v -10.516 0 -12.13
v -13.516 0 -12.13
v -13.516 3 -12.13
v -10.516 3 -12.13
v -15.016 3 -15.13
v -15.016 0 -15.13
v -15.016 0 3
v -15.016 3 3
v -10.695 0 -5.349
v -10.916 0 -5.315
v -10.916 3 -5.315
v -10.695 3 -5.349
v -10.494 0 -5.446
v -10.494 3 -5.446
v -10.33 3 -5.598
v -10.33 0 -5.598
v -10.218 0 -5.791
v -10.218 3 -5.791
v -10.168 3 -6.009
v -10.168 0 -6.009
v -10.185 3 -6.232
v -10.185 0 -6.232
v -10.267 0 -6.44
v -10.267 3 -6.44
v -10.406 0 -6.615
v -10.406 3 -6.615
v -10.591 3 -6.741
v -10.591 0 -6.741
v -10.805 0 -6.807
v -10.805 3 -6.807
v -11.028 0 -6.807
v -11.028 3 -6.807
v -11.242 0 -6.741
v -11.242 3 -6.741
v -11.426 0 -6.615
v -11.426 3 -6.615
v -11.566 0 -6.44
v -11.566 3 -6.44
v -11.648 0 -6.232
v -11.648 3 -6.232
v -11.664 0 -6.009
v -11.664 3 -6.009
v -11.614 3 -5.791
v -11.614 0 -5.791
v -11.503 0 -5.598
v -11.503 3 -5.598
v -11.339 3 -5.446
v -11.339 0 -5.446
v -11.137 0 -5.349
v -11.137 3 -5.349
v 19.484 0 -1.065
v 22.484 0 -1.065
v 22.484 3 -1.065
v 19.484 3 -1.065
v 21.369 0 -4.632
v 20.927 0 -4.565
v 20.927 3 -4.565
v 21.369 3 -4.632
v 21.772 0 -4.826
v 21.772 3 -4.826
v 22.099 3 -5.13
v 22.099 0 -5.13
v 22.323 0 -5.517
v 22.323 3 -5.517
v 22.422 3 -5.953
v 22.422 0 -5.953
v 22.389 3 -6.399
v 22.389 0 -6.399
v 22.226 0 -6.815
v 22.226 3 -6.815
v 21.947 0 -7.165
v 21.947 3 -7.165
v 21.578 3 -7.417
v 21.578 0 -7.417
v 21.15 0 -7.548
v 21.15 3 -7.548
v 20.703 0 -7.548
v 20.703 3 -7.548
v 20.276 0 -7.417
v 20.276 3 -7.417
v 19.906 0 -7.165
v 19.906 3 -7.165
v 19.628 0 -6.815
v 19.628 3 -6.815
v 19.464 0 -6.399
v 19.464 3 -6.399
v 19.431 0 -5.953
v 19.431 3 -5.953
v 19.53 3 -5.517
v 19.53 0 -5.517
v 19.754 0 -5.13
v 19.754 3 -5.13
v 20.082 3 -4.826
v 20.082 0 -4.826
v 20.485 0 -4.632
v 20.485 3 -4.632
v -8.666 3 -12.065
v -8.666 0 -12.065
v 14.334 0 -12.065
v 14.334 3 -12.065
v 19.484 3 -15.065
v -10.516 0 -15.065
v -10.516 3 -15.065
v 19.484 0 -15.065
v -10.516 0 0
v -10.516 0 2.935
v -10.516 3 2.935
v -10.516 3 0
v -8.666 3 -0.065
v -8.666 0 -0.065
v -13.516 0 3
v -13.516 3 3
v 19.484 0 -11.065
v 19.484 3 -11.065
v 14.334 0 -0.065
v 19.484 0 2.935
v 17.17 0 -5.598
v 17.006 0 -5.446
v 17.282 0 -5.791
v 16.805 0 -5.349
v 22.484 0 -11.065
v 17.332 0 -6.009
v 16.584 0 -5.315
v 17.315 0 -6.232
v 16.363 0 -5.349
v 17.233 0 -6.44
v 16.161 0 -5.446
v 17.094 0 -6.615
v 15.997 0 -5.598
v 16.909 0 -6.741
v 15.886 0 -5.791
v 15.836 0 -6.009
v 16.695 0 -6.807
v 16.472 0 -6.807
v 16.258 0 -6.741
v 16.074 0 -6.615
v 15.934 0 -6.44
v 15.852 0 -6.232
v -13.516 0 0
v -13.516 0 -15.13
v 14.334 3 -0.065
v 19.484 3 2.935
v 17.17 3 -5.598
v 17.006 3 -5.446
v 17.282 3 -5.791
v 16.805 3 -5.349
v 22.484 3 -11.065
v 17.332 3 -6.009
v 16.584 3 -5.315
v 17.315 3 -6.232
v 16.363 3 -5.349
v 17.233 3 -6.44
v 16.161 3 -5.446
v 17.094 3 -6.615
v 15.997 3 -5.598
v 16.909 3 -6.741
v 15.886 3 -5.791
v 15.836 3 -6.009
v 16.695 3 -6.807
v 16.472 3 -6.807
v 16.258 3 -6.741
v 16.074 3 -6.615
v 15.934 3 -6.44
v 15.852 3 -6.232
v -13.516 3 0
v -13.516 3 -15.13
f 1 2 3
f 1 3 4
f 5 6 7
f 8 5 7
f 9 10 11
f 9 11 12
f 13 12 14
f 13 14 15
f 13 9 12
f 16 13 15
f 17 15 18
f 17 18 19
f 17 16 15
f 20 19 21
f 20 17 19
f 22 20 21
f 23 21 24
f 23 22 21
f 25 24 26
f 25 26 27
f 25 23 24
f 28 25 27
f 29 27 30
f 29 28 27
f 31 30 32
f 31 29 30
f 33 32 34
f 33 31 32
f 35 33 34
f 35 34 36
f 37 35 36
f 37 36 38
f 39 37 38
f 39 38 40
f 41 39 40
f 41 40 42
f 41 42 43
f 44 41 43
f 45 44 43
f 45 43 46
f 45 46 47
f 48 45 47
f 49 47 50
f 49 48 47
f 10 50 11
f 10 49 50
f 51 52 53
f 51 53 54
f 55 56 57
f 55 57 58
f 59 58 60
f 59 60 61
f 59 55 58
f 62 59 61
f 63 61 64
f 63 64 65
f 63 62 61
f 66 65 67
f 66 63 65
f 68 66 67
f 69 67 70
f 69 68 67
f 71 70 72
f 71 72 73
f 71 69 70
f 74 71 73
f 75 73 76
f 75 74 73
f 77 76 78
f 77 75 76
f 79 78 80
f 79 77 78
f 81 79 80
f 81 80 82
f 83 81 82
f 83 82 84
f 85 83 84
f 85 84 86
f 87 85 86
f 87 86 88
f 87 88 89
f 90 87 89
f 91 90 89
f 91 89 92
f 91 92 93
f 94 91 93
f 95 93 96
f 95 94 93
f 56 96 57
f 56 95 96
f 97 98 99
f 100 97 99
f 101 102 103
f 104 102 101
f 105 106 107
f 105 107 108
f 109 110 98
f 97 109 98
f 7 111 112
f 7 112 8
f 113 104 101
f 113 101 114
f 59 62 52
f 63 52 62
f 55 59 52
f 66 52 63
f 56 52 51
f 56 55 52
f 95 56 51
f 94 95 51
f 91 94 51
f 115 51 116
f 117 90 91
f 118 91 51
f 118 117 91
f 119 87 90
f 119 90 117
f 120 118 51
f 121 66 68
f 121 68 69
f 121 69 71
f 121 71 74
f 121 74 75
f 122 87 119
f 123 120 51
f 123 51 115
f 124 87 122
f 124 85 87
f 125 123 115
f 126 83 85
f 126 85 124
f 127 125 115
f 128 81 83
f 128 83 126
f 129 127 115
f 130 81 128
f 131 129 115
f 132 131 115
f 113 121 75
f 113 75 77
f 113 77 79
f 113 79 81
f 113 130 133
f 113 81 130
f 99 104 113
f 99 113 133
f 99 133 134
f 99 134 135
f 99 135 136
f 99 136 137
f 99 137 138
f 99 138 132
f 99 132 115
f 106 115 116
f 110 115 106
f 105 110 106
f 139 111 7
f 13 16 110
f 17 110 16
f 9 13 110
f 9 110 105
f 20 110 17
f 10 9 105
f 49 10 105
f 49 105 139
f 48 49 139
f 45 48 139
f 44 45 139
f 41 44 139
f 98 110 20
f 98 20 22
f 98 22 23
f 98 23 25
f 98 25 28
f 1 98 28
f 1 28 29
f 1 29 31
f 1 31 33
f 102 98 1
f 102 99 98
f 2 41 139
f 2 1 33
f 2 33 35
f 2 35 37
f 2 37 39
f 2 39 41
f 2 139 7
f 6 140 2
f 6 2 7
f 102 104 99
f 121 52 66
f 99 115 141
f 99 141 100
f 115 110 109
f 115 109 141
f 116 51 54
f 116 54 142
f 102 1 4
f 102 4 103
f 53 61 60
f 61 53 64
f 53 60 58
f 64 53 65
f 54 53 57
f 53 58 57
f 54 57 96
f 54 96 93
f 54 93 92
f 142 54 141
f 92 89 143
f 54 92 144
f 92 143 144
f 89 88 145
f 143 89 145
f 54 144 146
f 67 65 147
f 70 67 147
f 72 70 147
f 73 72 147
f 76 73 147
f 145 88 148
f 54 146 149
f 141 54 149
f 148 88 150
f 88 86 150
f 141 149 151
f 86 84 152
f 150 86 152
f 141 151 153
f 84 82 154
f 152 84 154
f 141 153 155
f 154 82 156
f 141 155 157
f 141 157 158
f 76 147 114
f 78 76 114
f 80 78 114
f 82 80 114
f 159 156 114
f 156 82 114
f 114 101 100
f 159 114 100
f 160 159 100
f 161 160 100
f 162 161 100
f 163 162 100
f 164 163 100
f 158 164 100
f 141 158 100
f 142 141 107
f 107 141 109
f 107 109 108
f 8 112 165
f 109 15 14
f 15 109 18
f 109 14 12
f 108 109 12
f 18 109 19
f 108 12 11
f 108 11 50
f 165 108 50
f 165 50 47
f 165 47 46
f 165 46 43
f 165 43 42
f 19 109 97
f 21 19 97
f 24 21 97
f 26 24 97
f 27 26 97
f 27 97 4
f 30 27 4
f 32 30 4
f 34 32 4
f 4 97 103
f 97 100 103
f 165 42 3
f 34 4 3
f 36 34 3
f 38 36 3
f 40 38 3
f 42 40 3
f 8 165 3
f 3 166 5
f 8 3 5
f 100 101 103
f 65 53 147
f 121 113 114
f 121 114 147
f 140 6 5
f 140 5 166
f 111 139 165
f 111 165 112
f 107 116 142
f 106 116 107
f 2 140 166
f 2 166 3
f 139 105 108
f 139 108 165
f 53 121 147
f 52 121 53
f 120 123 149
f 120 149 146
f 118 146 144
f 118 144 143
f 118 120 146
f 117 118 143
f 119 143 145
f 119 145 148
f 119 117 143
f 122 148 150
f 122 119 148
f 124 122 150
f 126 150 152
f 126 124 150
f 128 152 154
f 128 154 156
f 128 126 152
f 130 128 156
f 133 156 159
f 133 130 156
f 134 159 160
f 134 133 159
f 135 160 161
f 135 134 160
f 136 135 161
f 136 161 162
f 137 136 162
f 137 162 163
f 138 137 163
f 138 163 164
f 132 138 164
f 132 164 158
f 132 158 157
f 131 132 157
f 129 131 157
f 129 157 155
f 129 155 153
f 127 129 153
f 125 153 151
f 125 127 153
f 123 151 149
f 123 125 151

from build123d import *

# Parameters (mm, degrees)
SKETCH_1_R      = 1.5
SKETCH_1_R_2    = 0.75
SKETCH_1_W      = 23
SKETCH_1_H      = 12
EXTRUDE_3_DEPTH = 3


with BuildPart() as part:
    # 草图1 → 凸台-拉伸3 (new body)
    with BuildSketch(Plane(origin=(0, 0, 0), x_dir=(1, 0, 0), z_dir=(0, 1, 0))):
        Polygon((-15.016304348, 6.130434783), (-15.016304348, 15.130434783), (-13.516304348, 15.130434783), (-13.516304348, 12.130434783), (-10.516304348, 12.130434783), (-10.516304348, 15.065217391), (19.483695652, 15.065217391), (19.483695652, 11.065217391), (22.483695652, 11.065217391), (22.483695652, 1.065217391), (19.483695652, 1.065217391), (19.483695652, -2.934782609), (-10.516304348, -2.934782609), (-10.516304348, 0), (-13.516304348, 0), (-13.516304348, -3), (-15.016304348, -3), (-15.016304348, 6), align=None)
        with Locations(Location((20.926676996, 6.065217391, 0), (0, 0, 270))):
            Circle(SKETCH_1_R, mode=Mode.SUBTRACT)
        with Locations(Location((-10.916304348, 6.065217391, 0), (0, 0, 270))):
            Circle(SKETCH_1_R_2, mode=Mode.SUBTRACT)
        with Locations(Location((16.583695652, 6.065217391, 0), (0, 0, 270))):
            Circle(SKETCH_1_R_2, mode=Mode.SUBTRACT)
        with Locations((2.833695652, 6.065217391)):
            Rectangle(SKETCH_1_W, SKETCH_1_H, mode=Mode.SUBTRACT)
    extrude(amount=EXTRUDE_3_DEPTH)


solid = part.part
